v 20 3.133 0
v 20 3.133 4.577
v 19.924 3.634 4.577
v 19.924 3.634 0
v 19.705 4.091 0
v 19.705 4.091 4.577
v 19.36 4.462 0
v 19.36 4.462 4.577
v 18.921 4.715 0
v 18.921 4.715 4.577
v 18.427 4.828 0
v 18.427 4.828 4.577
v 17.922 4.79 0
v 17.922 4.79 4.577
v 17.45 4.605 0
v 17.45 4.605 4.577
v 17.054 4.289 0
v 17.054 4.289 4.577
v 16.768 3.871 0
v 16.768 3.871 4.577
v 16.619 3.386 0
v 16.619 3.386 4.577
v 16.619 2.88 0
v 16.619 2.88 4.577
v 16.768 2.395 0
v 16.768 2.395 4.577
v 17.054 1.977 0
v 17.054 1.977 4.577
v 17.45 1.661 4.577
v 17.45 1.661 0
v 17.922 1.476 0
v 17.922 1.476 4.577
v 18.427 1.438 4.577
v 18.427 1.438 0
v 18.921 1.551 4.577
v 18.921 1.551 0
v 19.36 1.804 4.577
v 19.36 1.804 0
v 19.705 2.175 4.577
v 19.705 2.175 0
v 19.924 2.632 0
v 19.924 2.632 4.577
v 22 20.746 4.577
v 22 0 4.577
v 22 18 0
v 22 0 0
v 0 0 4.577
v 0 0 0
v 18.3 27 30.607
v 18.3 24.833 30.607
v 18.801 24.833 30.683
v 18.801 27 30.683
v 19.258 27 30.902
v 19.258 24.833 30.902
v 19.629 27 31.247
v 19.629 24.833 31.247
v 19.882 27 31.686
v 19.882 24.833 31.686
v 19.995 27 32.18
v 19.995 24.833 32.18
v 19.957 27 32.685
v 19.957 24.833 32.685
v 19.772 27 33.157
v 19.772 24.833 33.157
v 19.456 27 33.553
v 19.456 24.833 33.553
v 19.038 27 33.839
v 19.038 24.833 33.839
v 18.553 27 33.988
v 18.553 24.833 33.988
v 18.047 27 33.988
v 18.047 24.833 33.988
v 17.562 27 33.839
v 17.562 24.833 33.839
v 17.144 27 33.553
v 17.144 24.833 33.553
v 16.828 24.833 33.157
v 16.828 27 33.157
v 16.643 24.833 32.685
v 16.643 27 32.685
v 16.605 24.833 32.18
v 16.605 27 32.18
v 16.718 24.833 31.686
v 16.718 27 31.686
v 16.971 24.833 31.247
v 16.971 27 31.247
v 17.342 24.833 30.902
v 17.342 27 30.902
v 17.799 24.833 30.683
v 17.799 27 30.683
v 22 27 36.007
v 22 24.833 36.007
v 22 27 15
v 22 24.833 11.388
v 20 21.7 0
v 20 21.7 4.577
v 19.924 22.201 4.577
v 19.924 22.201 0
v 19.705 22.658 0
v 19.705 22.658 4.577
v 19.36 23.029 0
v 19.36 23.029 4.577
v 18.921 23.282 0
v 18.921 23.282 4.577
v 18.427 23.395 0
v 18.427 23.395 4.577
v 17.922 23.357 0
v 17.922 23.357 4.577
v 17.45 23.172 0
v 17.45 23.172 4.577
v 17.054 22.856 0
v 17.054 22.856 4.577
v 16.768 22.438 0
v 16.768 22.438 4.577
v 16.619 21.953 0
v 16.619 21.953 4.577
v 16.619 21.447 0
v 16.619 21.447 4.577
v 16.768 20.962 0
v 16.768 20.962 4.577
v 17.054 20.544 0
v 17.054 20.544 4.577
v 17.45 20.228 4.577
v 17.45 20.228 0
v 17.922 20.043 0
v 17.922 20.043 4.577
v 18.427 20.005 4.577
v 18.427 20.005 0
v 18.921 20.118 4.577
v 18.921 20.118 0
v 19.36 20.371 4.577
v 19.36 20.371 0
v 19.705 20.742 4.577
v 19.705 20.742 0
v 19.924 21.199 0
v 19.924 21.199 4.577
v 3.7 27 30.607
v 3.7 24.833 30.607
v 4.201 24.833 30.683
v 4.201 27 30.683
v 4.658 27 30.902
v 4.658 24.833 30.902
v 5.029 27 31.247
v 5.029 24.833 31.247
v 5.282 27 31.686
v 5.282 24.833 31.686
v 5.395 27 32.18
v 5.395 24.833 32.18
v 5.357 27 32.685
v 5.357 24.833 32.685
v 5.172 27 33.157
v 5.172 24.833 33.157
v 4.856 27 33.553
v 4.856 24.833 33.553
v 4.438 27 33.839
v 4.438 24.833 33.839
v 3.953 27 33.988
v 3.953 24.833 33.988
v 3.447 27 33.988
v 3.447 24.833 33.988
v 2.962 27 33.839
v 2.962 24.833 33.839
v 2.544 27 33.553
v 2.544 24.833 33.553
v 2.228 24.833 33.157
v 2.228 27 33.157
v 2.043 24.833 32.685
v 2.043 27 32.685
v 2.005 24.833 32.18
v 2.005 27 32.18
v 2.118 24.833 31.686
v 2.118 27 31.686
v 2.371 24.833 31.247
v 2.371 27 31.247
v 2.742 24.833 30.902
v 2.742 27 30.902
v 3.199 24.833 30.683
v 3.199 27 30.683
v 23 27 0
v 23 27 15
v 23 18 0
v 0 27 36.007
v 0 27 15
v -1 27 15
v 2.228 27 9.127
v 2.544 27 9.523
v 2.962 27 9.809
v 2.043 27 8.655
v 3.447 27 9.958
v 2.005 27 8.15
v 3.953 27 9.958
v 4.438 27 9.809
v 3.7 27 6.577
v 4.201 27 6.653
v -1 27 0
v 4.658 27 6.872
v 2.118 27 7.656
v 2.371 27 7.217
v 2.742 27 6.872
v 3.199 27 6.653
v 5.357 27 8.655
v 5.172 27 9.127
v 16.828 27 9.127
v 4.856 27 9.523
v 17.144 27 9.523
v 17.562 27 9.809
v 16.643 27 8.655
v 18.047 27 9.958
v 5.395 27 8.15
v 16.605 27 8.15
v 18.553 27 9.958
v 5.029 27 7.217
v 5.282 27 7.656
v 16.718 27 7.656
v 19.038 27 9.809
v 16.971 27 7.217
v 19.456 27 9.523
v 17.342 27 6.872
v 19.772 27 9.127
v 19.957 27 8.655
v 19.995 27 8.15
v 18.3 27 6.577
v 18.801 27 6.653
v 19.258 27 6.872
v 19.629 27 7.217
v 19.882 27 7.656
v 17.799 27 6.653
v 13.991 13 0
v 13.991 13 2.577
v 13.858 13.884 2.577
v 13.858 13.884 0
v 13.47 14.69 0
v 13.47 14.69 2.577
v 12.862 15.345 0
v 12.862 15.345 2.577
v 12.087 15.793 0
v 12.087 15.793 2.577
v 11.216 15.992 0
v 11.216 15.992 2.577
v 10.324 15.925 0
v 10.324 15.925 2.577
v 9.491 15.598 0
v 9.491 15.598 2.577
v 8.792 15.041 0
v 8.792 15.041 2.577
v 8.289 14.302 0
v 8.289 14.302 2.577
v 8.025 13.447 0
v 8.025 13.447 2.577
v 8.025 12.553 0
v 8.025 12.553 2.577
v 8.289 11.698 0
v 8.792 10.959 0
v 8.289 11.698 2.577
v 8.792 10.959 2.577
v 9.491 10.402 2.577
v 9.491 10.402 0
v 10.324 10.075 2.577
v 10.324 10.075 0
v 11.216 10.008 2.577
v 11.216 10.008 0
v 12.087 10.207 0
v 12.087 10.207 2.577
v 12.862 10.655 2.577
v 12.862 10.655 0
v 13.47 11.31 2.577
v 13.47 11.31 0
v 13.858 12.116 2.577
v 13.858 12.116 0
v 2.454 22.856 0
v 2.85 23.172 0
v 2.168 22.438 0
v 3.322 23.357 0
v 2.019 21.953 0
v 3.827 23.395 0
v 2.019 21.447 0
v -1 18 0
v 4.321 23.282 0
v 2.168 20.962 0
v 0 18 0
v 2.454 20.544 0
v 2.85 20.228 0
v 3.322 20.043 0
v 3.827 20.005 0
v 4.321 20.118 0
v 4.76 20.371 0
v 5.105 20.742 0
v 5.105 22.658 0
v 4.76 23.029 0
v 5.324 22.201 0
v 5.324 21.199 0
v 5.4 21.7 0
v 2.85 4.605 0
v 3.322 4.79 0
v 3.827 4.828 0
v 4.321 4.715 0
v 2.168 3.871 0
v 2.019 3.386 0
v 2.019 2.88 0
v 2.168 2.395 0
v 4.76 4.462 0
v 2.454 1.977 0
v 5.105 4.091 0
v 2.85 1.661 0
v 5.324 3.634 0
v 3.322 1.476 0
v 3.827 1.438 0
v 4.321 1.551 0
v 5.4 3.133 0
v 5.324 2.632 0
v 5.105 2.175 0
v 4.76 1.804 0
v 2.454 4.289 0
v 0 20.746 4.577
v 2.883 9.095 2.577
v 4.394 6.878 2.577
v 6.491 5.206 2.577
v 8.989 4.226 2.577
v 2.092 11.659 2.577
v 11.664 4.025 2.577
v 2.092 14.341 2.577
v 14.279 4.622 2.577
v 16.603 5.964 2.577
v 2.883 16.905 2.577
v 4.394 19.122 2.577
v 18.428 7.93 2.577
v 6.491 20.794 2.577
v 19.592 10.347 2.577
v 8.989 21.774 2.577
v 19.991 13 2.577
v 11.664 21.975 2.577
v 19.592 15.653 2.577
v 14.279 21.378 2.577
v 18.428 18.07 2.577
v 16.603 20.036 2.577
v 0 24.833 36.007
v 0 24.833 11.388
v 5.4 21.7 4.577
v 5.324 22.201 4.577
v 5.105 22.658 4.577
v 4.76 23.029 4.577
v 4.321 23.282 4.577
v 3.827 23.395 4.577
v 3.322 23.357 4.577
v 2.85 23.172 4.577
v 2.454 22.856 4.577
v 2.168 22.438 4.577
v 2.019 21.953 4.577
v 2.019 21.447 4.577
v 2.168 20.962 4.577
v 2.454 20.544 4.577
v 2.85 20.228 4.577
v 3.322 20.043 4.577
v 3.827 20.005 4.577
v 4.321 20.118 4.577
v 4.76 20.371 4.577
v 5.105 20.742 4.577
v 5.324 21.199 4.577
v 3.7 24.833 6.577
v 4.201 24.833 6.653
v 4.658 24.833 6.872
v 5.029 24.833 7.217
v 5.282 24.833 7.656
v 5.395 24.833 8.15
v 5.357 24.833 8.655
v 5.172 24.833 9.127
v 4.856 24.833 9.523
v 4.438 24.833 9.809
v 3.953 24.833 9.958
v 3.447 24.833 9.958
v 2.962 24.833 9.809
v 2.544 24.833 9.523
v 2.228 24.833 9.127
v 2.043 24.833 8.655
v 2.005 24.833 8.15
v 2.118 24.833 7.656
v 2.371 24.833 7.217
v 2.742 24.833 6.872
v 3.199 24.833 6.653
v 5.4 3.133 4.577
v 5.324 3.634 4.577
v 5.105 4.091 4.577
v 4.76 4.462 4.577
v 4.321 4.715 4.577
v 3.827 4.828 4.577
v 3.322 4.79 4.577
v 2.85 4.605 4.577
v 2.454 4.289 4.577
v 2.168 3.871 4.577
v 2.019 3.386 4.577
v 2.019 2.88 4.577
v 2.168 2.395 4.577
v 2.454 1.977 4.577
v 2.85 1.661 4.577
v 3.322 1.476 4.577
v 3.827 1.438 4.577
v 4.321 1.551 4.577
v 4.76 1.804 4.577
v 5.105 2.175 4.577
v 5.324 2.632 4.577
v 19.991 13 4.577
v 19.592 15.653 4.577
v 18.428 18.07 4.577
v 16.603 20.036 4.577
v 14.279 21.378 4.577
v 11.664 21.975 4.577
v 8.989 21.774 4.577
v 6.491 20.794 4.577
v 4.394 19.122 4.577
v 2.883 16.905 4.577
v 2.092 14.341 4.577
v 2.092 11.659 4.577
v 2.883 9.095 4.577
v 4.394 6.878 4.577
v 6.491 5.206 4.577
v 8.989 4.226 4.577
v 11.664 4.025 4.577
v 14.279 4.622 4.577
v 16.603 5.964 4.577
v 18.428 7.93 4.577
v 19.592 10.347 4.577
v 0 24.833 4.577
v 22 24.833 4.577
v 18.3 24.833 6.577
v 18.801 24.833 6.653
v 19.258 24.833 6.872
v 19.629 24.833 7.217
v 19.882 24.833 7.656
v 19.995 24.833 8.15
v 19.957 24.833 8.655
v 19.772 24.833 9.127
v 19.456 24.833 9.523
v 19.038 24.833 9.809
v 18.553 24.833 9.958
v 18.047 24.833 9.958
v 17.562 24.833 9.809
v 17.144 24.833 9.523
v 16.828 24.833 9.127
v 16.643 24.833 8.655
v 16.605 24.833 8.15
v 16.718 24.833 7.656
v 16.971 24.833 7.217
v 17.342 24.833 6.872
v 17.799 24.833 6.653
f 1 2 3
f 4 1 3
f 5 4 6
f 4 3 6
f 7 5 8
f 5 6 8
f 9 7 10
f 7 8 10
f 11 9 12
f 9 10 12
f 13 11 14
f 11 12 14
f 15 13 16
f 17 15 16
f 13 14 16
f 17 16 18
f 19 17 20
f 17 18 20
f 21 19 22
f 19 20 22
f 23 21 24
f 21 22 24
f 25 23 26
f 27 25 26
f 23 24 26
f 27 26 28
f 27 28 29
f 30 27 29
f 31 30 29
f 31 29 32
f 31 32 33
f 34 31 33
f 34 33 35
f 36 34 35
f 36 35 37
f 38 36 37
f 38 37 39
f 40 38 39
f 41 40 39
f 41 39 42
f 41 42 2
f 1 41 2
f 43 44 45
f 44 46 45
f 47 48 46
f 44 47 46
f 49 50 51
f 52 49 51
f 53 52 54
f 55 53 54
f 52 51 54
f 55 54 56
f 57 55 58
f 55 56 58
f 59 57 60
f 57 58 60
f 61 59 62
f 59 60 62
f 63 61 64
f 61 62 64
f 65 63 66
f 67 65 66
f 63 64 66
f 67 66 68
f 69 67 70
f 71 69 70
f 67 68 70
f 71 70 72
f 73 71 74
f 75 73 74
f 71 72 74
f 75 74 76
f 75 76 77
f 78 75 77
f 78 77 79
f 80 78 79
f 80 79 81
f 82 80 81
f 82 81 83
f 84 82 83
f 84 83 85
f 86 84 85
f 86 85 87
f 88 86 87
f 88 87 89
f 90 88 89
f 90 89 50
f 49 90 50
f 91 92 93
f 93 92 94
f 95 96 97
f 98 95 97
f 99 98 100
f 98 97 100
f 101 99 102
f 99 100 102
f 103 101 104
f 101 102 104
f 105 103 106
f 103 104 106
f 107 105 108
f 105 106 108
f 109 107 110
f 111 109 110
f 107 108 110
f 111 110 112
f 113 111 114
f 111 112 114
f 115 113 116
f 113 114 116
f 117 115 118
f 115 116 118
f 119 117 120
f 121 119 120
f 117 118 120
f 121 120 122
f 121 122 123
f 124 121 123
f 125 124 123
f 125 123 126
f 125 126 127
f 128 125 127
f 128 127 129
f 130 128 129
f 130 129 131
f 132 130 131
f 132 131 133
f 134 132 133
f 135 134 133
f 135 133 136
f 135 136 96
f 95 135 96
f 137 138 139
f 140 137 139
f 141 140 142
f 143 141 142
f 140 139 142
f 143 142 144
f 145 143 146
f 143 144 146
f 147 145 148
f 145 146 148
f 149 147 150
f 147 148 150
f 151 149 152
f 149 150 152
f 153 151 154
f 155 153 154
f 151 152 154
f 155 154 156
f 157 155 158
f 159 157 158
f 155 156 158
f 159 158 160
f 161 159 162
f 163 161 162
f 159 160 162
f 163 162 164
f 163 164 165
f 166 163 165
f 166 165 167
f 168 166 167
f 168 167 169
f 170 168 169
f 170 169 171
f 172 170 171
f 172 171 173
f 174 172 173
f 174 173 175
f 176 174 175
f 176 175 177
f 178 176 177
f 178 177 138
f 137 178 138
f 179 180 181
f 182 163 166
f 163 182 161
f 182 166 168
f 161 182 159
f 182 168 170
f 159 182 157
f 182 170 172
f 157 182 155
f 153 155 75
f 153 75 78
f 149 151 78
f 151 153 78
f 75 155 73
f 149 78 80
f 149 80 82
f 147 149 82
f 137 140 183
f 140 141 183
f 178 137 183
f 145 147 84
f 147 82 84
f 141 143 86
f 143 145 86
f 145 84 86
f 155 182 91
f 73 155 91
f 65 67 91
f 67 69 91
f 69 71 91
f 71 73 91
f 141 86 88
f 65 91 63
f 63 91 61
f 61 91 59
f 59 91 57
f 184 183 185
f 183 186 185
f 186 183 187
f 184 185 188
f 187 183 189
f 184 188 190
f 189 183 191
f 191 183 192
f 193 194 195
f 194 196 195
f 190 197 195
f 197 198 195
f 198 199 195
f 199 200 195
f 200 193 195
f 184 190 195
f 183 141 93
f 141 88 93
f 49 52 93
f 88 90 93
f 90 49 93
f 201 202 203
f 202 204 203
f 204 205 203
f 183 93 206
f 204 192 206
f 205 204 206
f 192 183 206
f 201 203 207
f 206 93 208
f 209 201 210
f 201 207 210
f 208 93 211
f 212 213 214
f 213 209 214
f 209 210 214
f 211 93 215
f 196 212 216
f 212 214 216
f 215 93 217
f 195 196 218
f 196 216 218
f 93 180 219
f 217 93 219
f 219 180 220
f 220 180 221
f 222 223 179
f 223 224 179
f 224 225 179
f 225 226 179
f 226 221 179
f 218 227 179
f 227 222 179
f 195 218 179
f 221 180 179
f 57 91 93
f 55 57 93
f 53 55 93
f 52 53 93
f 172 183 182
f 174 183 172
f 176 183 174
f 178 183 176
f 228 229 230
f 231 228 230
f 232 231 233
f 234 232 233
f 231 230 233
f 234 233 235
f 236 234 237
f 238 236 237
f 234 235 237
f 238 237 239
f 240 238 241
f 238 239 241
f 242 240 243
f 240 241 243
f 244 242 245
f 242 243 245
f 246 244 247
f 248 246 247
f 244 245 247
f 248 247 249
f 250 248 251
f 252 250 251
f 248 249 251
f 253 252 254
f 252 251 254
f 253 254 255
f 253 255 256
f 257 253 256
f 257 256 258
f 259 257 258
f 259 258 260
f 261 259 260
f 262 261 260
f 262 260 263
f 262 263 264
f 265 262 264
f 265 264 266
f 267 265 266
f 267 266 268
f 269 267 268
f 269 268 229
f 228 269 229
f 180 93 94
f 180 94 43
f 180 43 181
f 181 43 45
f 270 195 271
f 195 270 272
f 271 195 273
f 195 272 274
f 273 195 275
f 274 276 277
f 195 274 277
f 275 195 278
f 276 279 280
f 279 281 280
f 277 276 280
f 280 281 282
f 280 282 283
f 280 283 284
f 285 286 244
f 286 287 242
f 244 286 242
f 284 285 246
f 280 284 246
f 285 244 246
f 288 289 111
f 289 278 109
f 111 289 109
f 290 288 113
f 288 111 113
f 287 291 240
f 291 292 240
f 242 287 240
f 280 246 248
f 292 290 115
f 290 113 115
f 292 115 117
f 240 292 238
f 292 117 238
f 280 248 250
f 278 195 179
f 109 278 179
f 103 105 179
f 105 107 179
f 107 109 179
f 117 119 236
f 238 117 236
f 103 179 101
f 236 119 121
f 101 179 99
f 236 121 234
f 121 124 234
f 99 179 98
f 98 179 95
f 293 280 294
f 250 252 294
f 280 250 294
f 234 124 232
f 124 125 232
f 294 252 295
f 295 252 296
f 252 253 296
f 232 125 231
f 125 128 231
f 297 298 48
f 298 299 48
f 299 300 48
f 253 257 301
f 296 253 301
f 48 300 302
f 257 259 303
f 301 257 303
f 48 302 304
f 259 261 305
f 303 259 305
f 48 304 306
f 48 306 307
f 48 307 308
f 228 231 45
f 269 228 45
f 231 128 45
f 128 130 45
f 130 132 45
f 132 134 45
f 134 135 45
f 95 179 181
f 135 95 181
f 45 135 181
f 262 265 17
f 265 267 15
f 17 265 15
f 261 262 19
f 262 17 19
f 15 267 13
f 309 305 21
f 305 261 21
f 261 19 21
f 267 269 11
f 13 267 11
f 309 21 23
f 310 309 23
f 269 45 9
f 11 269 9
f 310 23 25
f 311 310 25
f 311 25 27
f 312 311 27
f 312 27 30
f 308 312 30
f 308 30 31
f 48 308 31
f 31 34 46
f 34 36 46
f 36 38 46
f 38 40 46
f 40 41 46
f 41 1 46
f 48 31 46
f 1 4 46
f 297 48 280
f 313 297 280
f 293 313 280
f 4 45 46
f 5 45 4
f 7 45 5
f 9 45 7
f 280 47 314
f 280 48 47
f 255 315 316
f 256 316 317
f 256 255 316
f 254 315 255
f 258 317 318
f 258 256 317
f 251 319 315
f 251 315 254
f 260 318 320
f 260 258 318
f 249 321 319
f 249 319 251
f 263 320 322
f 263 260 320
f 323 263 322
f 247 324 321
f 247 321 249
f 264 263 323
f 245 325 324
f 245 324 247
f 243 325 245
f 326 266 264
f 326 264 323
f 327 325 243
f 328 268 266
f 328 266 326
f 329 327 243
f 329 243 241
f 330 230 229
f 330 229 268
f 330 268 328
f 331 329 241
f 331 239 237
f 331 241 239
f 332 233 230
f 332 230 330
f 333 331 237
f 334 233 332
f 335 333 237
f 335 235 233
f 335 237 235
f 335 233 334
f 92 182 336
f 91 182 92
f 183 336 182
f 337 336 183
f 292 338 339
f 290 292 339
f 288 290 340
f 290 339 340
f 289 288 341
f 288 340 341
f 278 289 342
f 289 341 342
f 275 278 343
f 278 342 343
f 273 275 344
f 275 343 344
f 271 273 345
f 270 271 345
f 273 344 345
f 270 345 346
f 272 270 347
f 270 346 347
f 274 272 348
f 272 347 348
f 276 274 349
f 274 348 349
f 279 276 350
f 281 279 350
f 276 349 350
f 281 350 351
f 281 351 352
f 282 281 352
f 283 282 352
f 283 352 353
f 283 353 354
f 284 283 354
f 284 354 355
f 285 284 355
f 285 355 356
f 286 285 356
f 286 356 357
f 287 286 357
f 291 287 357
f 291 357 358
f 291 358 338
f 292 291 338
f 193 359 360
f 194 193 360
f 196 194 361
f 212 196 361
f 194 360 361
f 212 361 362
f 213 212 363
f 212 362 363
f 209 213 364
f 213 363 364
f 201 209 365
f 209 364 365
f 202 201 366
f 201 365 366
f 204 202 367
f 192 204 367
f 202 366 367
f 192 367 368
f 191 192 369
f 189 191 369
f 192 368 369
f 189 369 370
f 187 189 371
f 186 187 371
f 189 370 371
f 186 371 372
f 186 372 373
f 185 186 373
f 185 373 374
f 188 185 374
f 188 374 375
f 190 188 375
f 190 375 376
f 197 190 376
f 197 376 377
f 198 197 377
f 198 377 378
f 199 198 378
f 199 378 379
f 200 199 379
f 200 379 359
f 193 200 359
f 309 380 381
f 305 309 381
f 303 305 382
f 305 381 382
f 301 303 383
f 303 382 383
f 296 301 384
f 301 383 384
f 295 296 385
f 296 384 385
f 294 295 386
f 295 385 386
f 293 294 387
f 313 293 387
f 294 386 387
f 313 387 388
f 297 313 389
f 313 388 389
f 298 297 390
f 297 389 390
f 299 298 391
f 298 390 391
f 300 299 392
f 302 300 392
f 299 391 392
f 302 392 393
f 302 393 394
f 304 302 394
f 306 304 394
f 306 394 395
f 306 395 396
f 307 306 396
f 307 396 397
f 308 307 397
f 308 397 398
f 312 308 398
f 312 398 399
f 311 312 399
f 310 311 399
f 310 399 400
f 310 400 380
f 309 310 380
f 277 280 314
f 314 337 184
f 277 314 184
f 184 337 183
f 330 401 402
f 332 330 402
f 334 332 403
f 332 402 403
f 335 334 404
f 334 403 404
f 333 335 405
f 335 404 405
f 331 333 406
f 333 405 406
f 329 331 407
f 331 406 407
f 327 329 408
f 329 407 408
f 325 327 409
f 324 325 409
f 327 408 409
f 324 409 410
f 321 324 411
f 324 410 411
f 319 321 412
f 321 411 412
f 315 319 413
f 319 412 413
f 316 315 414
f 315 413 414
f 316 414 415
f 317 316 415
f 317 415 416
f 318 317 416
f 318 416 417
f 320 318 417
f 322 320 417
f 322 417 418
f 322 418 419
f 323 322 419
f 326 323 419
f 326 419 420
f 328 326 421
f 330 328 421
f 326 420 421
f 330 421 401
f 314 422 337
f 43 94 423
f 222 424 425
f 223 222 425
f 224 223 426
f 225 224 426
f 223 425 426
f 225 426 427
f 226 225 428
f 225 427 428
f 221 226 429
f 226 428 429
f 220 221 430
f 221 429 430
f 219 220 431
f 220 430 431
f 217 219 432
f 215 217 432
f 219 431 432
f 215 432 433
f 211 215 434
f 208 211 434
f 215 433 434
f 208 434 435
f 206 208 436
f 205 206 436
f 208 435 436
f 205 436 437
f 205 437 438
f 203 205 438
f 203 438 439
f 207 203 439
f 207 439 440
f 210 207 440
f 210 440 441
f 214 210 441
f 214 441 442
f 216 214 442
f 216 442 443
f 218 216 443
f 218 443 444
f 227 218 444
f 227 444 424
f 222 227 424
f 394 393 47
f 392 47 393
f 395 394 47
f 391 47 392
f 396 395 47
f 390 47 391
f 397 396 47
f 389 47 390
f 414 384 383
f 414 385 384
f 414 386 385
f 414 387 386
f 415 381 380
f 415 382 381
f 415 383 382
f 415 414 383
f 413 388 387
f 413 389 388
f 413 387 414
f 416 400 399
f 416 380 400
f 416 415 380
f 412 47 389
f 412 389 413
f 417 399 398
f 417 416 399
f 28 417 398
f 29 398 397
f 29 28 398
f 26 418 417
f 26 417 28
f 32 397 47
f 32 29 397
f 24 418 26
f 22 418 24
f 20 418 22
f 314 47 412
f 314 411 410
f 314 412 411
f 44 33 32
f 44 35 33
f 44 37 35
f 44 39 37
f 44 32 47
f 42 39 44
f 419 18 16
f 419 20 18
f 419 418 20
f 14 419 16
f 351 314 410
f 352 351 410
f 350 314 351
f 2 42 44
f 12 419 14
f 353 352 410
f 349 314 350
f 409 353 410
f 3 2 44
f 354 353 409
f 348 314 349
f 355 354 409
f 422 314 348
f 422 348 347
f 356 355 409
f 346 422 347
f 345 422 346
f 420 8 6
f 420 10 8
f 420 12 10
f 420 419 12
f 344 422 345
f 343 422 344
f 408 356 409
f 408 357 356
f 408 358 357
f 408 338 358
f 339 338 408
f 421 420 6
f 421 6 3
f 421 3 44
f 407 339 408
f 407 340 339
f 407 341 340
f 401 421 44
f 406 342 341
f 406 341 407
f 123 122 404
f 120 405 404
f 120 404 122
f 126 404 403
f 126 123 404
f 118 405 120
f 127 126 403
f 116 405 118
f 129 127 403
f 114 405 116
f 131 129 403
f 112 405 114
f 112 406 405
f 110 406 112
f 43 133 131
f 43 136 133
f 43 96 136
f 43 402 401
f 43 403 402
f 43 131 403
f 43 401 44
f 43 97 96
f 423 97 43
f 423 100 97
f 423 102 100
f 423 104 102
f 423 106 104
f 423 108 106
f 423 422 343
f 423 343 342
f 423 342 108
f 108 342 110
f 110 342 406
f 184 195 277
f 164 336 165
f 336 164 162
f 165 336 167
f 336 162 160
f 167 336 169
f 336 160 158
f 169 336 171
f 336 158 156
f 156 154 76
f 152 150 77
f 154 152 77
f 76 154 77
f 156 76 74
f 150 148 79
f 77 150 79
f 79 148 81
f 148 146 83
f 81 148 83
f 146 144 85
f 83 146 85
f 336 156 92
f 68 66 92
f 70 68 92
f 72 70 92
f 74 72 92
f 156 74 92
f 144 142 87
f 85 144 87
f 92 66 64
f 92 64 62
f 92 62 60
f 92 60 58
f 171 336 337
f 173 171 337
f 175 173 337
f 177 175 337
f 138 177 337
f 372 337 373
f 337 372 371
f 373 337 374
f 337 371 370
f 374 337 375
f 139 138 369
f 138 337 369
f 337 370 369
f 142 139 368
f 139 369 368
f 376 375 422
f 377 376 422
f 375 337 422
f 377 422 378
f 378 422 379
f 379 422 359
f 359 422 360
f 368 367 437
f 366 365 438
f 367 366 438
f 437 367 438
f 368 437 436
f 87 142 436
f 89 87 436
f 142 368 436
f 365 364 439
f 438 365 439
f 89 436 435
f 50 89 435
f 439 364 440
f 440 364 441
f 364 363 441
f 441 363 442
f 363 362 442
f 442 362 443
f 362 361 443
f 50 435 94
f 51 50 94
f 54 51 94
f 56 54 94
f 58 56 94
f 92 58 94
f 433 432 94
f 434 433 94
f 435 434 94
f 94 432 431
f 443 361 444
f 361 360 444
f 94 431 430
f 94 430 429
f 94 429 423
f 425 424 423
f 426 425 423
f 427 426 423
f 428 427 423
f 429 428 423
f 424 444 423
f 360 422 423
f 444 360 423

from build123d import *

# Parameters (mm, degrees)
SKETCH1_W           = 22
SKETCH1_H           = 27
BOSS_EXTRUDE1_DEPTH = 4.577
SKETCH2_W           = 22
SKETCH2_H           = 2.167
BOSS_EXTRUDE2_DEPTH = 31.43
SKETCH5_R           = 1.7
CUT_EXTRUDE1_DEPTH  = 49.961024683
SKETCH6_R           = 1.7
CUT_EXTRUDE2_DEPTH  = 49.961024683
SKETCH7_R           = 1.7
CUT_EXTRUDE3_DEPTH  = 49.961024683
SKETCH8_R           = 1.7
CUT_EXTRUDE4_DEPTH  = 49.961024683
BOSS_EXTRUDE6_DEPTH = 1
BOSS_EXTRUDE7_DEPTH = 1
SKETCH10_R          = 1.7
CUT_EXTRUDE6_DEPTH  = 48.390346063
SKETCH10_7_R        = 1.7
CUT_EXTRUDE7_DEPTH  = 10
SKETCH10_8_R        = 1.7
CUT_EXTRUDE8_DEPTH  = 10
SKETCH10_9_R        = 1.7
CUT_EXTRUDE9_DEPTH  = 10
SKETCH10_10_R       = 9
CUT_EXTRUDE10_DEPTH = 2
SKETCH10_12_R       = 3
CUT_EXTRUDE11_DEPTH = 48.390346063


with BuildPart() as part:
    # Sketch1 → Boss-Extrude1 (new body)
    with BuildSketch(Plane.XY):
        with Locations((11, 13.5)):
            Rectangle(SKETCH1_W, SKETCH1_H)
    extrude(amount=BOSS_EXTRUDE1_DEPTH)

    # Sketch2 → Boss-Extrude2 (add)
    with BuildSketch(Plane.XY.offset(4.577)):
        with Locations((11, 25.9165)):
            Rectangle(SKETCH2_W, SKETCH2_H)
    extrude(amount=BOSS_EXTRUDE2_DEPTH)

    # Sketch5 → Cut-Extrude1 (cut, through all)
    with BuildSketch(Plane.XZ.offset(-24.833)):
        with Locations((3.7, 8.277)):
            Circle(SKETCH5_R)
    extrude(amount=-CUT_EXTRUDE1_DEPTH, mode=Mode.SUBTRACT)

    # Sketch6 → Cut-Extrude2 (cut, through all)
    with BuildSketch(Plane.XZ.offset(-24.833)):
        with Locations((18.3, 8.277)):
            Circle(SKETCH6_R)
    extrude(amount=-CUT_EXTRUDE2_DEPTH, mode=Mode.SUBTRACT)

    # Sketch7 → Cut-Extrude3 (cut, through all)
    with BuildSketch(Plane.XZ.offset(-24.833)):
        with Locations((3.7, 32.307)):
            Circle(SKETCH7_R)
    extrude(amount=-CUT_EXTRUDE3_DEPTH, mode=Mode.SUBTRACT)

    # Sketch8 → Cut-Extrude4 (cut, through all)
    with BuildSketch(Plane.XZ.offset(-24.833)):
        with Locations((18.3, 32.307)):
            Circle(SKETCH8_R)
    extrude(amount=-CUT_EXTRUDE4_DEPTH, mode=Mode.SUBTRACT)

    # Sketch12 → Boss-Extrude6 (add)
    with BuildSketch(Plane(origin=(22, 0, 0), x_dir=(0, 0, -1), z_dir=(1, 0, 0))):
        Polygon((0, 27), (-15, 27), (0, 18), align=None)
    extrude(amount=BOSS_EXTRUDE6_DEPTH)

    # Sketch13 → Boss-Extrude7 (add)
    with BuildSketch(Plane.ZY):
        Polygon((0, 27), (0, 18), (15, 27), align=None)
    extrude(amount=BOSS_EXTRUDE7_DEPTH)

    # Sketch10 → Cut-Extrude6 (cut, through all)
    with BuildSketch(Plane.XY.offset(4.577)):
        with Locations((18.3, 21.7)):
            Circle(SKETCH10_R)
    extrude(amount=-CUT_EXTRUDE6_DEPTH, mode=Mode.SUBTRACT)

    # Sketch10<7> → Cut-Extrude7 (cut)
    with BuildSketch(Plane.XY.offset(4.577)):
        with Locations((3.7, 21.7)):
            Circle(SKETCH10_7_R)
    extrude(amount=-CUT_EXTRUDE7_DEPTH, mode=Mode.SUBTRACT)

    # Sketch10<8> → Cut-Extrude8 (cut)
    with BuildSketch(Plane.XY.offset(4.577)):
        with Locations((18.3, 3.133)):
            Circle(SKETCH10_8_R)
    extrude(amount=-CUT_EXTRUDE8_DEPTH, mode=Mode.SUBTRACT)

    # Sketch10<9> → Cut-Extrude9 (cut)
    with BuildSketch(Plane.XY.offset(4.577)):
        with Locations((3.7, 3.133)):
            Circle(SKETCH10_9_R)
    extrude(amount=-CUT_EXTRUDE9_DEPTH, mode=Mode.SUBTRACT)

    # Sketch10<10> → Cut-Extrude10 (cut)
    with BuildSketch(Plane.XY.offset(4.577)):
        with Locations((10.991429636, 13)):
            Circle(SKETCH10_10_R)
    extrude(amount=-CUT_EXTRUDE10_DEPTH, mode=Mode.SUBTRACT)

    # Sketch10<12> → Cut-Extrude11 (cut, through all)
    with BuildSketch(Plane.XY.offset(4.577)):
        with Locations((10.991429636, 13)):
            Circle(SKETCH10_12_R)
    extrude(amount=-CUT_EXTRUDE11_DEPTH, mode=Mode.SUBTRACT)


solid = part.part
